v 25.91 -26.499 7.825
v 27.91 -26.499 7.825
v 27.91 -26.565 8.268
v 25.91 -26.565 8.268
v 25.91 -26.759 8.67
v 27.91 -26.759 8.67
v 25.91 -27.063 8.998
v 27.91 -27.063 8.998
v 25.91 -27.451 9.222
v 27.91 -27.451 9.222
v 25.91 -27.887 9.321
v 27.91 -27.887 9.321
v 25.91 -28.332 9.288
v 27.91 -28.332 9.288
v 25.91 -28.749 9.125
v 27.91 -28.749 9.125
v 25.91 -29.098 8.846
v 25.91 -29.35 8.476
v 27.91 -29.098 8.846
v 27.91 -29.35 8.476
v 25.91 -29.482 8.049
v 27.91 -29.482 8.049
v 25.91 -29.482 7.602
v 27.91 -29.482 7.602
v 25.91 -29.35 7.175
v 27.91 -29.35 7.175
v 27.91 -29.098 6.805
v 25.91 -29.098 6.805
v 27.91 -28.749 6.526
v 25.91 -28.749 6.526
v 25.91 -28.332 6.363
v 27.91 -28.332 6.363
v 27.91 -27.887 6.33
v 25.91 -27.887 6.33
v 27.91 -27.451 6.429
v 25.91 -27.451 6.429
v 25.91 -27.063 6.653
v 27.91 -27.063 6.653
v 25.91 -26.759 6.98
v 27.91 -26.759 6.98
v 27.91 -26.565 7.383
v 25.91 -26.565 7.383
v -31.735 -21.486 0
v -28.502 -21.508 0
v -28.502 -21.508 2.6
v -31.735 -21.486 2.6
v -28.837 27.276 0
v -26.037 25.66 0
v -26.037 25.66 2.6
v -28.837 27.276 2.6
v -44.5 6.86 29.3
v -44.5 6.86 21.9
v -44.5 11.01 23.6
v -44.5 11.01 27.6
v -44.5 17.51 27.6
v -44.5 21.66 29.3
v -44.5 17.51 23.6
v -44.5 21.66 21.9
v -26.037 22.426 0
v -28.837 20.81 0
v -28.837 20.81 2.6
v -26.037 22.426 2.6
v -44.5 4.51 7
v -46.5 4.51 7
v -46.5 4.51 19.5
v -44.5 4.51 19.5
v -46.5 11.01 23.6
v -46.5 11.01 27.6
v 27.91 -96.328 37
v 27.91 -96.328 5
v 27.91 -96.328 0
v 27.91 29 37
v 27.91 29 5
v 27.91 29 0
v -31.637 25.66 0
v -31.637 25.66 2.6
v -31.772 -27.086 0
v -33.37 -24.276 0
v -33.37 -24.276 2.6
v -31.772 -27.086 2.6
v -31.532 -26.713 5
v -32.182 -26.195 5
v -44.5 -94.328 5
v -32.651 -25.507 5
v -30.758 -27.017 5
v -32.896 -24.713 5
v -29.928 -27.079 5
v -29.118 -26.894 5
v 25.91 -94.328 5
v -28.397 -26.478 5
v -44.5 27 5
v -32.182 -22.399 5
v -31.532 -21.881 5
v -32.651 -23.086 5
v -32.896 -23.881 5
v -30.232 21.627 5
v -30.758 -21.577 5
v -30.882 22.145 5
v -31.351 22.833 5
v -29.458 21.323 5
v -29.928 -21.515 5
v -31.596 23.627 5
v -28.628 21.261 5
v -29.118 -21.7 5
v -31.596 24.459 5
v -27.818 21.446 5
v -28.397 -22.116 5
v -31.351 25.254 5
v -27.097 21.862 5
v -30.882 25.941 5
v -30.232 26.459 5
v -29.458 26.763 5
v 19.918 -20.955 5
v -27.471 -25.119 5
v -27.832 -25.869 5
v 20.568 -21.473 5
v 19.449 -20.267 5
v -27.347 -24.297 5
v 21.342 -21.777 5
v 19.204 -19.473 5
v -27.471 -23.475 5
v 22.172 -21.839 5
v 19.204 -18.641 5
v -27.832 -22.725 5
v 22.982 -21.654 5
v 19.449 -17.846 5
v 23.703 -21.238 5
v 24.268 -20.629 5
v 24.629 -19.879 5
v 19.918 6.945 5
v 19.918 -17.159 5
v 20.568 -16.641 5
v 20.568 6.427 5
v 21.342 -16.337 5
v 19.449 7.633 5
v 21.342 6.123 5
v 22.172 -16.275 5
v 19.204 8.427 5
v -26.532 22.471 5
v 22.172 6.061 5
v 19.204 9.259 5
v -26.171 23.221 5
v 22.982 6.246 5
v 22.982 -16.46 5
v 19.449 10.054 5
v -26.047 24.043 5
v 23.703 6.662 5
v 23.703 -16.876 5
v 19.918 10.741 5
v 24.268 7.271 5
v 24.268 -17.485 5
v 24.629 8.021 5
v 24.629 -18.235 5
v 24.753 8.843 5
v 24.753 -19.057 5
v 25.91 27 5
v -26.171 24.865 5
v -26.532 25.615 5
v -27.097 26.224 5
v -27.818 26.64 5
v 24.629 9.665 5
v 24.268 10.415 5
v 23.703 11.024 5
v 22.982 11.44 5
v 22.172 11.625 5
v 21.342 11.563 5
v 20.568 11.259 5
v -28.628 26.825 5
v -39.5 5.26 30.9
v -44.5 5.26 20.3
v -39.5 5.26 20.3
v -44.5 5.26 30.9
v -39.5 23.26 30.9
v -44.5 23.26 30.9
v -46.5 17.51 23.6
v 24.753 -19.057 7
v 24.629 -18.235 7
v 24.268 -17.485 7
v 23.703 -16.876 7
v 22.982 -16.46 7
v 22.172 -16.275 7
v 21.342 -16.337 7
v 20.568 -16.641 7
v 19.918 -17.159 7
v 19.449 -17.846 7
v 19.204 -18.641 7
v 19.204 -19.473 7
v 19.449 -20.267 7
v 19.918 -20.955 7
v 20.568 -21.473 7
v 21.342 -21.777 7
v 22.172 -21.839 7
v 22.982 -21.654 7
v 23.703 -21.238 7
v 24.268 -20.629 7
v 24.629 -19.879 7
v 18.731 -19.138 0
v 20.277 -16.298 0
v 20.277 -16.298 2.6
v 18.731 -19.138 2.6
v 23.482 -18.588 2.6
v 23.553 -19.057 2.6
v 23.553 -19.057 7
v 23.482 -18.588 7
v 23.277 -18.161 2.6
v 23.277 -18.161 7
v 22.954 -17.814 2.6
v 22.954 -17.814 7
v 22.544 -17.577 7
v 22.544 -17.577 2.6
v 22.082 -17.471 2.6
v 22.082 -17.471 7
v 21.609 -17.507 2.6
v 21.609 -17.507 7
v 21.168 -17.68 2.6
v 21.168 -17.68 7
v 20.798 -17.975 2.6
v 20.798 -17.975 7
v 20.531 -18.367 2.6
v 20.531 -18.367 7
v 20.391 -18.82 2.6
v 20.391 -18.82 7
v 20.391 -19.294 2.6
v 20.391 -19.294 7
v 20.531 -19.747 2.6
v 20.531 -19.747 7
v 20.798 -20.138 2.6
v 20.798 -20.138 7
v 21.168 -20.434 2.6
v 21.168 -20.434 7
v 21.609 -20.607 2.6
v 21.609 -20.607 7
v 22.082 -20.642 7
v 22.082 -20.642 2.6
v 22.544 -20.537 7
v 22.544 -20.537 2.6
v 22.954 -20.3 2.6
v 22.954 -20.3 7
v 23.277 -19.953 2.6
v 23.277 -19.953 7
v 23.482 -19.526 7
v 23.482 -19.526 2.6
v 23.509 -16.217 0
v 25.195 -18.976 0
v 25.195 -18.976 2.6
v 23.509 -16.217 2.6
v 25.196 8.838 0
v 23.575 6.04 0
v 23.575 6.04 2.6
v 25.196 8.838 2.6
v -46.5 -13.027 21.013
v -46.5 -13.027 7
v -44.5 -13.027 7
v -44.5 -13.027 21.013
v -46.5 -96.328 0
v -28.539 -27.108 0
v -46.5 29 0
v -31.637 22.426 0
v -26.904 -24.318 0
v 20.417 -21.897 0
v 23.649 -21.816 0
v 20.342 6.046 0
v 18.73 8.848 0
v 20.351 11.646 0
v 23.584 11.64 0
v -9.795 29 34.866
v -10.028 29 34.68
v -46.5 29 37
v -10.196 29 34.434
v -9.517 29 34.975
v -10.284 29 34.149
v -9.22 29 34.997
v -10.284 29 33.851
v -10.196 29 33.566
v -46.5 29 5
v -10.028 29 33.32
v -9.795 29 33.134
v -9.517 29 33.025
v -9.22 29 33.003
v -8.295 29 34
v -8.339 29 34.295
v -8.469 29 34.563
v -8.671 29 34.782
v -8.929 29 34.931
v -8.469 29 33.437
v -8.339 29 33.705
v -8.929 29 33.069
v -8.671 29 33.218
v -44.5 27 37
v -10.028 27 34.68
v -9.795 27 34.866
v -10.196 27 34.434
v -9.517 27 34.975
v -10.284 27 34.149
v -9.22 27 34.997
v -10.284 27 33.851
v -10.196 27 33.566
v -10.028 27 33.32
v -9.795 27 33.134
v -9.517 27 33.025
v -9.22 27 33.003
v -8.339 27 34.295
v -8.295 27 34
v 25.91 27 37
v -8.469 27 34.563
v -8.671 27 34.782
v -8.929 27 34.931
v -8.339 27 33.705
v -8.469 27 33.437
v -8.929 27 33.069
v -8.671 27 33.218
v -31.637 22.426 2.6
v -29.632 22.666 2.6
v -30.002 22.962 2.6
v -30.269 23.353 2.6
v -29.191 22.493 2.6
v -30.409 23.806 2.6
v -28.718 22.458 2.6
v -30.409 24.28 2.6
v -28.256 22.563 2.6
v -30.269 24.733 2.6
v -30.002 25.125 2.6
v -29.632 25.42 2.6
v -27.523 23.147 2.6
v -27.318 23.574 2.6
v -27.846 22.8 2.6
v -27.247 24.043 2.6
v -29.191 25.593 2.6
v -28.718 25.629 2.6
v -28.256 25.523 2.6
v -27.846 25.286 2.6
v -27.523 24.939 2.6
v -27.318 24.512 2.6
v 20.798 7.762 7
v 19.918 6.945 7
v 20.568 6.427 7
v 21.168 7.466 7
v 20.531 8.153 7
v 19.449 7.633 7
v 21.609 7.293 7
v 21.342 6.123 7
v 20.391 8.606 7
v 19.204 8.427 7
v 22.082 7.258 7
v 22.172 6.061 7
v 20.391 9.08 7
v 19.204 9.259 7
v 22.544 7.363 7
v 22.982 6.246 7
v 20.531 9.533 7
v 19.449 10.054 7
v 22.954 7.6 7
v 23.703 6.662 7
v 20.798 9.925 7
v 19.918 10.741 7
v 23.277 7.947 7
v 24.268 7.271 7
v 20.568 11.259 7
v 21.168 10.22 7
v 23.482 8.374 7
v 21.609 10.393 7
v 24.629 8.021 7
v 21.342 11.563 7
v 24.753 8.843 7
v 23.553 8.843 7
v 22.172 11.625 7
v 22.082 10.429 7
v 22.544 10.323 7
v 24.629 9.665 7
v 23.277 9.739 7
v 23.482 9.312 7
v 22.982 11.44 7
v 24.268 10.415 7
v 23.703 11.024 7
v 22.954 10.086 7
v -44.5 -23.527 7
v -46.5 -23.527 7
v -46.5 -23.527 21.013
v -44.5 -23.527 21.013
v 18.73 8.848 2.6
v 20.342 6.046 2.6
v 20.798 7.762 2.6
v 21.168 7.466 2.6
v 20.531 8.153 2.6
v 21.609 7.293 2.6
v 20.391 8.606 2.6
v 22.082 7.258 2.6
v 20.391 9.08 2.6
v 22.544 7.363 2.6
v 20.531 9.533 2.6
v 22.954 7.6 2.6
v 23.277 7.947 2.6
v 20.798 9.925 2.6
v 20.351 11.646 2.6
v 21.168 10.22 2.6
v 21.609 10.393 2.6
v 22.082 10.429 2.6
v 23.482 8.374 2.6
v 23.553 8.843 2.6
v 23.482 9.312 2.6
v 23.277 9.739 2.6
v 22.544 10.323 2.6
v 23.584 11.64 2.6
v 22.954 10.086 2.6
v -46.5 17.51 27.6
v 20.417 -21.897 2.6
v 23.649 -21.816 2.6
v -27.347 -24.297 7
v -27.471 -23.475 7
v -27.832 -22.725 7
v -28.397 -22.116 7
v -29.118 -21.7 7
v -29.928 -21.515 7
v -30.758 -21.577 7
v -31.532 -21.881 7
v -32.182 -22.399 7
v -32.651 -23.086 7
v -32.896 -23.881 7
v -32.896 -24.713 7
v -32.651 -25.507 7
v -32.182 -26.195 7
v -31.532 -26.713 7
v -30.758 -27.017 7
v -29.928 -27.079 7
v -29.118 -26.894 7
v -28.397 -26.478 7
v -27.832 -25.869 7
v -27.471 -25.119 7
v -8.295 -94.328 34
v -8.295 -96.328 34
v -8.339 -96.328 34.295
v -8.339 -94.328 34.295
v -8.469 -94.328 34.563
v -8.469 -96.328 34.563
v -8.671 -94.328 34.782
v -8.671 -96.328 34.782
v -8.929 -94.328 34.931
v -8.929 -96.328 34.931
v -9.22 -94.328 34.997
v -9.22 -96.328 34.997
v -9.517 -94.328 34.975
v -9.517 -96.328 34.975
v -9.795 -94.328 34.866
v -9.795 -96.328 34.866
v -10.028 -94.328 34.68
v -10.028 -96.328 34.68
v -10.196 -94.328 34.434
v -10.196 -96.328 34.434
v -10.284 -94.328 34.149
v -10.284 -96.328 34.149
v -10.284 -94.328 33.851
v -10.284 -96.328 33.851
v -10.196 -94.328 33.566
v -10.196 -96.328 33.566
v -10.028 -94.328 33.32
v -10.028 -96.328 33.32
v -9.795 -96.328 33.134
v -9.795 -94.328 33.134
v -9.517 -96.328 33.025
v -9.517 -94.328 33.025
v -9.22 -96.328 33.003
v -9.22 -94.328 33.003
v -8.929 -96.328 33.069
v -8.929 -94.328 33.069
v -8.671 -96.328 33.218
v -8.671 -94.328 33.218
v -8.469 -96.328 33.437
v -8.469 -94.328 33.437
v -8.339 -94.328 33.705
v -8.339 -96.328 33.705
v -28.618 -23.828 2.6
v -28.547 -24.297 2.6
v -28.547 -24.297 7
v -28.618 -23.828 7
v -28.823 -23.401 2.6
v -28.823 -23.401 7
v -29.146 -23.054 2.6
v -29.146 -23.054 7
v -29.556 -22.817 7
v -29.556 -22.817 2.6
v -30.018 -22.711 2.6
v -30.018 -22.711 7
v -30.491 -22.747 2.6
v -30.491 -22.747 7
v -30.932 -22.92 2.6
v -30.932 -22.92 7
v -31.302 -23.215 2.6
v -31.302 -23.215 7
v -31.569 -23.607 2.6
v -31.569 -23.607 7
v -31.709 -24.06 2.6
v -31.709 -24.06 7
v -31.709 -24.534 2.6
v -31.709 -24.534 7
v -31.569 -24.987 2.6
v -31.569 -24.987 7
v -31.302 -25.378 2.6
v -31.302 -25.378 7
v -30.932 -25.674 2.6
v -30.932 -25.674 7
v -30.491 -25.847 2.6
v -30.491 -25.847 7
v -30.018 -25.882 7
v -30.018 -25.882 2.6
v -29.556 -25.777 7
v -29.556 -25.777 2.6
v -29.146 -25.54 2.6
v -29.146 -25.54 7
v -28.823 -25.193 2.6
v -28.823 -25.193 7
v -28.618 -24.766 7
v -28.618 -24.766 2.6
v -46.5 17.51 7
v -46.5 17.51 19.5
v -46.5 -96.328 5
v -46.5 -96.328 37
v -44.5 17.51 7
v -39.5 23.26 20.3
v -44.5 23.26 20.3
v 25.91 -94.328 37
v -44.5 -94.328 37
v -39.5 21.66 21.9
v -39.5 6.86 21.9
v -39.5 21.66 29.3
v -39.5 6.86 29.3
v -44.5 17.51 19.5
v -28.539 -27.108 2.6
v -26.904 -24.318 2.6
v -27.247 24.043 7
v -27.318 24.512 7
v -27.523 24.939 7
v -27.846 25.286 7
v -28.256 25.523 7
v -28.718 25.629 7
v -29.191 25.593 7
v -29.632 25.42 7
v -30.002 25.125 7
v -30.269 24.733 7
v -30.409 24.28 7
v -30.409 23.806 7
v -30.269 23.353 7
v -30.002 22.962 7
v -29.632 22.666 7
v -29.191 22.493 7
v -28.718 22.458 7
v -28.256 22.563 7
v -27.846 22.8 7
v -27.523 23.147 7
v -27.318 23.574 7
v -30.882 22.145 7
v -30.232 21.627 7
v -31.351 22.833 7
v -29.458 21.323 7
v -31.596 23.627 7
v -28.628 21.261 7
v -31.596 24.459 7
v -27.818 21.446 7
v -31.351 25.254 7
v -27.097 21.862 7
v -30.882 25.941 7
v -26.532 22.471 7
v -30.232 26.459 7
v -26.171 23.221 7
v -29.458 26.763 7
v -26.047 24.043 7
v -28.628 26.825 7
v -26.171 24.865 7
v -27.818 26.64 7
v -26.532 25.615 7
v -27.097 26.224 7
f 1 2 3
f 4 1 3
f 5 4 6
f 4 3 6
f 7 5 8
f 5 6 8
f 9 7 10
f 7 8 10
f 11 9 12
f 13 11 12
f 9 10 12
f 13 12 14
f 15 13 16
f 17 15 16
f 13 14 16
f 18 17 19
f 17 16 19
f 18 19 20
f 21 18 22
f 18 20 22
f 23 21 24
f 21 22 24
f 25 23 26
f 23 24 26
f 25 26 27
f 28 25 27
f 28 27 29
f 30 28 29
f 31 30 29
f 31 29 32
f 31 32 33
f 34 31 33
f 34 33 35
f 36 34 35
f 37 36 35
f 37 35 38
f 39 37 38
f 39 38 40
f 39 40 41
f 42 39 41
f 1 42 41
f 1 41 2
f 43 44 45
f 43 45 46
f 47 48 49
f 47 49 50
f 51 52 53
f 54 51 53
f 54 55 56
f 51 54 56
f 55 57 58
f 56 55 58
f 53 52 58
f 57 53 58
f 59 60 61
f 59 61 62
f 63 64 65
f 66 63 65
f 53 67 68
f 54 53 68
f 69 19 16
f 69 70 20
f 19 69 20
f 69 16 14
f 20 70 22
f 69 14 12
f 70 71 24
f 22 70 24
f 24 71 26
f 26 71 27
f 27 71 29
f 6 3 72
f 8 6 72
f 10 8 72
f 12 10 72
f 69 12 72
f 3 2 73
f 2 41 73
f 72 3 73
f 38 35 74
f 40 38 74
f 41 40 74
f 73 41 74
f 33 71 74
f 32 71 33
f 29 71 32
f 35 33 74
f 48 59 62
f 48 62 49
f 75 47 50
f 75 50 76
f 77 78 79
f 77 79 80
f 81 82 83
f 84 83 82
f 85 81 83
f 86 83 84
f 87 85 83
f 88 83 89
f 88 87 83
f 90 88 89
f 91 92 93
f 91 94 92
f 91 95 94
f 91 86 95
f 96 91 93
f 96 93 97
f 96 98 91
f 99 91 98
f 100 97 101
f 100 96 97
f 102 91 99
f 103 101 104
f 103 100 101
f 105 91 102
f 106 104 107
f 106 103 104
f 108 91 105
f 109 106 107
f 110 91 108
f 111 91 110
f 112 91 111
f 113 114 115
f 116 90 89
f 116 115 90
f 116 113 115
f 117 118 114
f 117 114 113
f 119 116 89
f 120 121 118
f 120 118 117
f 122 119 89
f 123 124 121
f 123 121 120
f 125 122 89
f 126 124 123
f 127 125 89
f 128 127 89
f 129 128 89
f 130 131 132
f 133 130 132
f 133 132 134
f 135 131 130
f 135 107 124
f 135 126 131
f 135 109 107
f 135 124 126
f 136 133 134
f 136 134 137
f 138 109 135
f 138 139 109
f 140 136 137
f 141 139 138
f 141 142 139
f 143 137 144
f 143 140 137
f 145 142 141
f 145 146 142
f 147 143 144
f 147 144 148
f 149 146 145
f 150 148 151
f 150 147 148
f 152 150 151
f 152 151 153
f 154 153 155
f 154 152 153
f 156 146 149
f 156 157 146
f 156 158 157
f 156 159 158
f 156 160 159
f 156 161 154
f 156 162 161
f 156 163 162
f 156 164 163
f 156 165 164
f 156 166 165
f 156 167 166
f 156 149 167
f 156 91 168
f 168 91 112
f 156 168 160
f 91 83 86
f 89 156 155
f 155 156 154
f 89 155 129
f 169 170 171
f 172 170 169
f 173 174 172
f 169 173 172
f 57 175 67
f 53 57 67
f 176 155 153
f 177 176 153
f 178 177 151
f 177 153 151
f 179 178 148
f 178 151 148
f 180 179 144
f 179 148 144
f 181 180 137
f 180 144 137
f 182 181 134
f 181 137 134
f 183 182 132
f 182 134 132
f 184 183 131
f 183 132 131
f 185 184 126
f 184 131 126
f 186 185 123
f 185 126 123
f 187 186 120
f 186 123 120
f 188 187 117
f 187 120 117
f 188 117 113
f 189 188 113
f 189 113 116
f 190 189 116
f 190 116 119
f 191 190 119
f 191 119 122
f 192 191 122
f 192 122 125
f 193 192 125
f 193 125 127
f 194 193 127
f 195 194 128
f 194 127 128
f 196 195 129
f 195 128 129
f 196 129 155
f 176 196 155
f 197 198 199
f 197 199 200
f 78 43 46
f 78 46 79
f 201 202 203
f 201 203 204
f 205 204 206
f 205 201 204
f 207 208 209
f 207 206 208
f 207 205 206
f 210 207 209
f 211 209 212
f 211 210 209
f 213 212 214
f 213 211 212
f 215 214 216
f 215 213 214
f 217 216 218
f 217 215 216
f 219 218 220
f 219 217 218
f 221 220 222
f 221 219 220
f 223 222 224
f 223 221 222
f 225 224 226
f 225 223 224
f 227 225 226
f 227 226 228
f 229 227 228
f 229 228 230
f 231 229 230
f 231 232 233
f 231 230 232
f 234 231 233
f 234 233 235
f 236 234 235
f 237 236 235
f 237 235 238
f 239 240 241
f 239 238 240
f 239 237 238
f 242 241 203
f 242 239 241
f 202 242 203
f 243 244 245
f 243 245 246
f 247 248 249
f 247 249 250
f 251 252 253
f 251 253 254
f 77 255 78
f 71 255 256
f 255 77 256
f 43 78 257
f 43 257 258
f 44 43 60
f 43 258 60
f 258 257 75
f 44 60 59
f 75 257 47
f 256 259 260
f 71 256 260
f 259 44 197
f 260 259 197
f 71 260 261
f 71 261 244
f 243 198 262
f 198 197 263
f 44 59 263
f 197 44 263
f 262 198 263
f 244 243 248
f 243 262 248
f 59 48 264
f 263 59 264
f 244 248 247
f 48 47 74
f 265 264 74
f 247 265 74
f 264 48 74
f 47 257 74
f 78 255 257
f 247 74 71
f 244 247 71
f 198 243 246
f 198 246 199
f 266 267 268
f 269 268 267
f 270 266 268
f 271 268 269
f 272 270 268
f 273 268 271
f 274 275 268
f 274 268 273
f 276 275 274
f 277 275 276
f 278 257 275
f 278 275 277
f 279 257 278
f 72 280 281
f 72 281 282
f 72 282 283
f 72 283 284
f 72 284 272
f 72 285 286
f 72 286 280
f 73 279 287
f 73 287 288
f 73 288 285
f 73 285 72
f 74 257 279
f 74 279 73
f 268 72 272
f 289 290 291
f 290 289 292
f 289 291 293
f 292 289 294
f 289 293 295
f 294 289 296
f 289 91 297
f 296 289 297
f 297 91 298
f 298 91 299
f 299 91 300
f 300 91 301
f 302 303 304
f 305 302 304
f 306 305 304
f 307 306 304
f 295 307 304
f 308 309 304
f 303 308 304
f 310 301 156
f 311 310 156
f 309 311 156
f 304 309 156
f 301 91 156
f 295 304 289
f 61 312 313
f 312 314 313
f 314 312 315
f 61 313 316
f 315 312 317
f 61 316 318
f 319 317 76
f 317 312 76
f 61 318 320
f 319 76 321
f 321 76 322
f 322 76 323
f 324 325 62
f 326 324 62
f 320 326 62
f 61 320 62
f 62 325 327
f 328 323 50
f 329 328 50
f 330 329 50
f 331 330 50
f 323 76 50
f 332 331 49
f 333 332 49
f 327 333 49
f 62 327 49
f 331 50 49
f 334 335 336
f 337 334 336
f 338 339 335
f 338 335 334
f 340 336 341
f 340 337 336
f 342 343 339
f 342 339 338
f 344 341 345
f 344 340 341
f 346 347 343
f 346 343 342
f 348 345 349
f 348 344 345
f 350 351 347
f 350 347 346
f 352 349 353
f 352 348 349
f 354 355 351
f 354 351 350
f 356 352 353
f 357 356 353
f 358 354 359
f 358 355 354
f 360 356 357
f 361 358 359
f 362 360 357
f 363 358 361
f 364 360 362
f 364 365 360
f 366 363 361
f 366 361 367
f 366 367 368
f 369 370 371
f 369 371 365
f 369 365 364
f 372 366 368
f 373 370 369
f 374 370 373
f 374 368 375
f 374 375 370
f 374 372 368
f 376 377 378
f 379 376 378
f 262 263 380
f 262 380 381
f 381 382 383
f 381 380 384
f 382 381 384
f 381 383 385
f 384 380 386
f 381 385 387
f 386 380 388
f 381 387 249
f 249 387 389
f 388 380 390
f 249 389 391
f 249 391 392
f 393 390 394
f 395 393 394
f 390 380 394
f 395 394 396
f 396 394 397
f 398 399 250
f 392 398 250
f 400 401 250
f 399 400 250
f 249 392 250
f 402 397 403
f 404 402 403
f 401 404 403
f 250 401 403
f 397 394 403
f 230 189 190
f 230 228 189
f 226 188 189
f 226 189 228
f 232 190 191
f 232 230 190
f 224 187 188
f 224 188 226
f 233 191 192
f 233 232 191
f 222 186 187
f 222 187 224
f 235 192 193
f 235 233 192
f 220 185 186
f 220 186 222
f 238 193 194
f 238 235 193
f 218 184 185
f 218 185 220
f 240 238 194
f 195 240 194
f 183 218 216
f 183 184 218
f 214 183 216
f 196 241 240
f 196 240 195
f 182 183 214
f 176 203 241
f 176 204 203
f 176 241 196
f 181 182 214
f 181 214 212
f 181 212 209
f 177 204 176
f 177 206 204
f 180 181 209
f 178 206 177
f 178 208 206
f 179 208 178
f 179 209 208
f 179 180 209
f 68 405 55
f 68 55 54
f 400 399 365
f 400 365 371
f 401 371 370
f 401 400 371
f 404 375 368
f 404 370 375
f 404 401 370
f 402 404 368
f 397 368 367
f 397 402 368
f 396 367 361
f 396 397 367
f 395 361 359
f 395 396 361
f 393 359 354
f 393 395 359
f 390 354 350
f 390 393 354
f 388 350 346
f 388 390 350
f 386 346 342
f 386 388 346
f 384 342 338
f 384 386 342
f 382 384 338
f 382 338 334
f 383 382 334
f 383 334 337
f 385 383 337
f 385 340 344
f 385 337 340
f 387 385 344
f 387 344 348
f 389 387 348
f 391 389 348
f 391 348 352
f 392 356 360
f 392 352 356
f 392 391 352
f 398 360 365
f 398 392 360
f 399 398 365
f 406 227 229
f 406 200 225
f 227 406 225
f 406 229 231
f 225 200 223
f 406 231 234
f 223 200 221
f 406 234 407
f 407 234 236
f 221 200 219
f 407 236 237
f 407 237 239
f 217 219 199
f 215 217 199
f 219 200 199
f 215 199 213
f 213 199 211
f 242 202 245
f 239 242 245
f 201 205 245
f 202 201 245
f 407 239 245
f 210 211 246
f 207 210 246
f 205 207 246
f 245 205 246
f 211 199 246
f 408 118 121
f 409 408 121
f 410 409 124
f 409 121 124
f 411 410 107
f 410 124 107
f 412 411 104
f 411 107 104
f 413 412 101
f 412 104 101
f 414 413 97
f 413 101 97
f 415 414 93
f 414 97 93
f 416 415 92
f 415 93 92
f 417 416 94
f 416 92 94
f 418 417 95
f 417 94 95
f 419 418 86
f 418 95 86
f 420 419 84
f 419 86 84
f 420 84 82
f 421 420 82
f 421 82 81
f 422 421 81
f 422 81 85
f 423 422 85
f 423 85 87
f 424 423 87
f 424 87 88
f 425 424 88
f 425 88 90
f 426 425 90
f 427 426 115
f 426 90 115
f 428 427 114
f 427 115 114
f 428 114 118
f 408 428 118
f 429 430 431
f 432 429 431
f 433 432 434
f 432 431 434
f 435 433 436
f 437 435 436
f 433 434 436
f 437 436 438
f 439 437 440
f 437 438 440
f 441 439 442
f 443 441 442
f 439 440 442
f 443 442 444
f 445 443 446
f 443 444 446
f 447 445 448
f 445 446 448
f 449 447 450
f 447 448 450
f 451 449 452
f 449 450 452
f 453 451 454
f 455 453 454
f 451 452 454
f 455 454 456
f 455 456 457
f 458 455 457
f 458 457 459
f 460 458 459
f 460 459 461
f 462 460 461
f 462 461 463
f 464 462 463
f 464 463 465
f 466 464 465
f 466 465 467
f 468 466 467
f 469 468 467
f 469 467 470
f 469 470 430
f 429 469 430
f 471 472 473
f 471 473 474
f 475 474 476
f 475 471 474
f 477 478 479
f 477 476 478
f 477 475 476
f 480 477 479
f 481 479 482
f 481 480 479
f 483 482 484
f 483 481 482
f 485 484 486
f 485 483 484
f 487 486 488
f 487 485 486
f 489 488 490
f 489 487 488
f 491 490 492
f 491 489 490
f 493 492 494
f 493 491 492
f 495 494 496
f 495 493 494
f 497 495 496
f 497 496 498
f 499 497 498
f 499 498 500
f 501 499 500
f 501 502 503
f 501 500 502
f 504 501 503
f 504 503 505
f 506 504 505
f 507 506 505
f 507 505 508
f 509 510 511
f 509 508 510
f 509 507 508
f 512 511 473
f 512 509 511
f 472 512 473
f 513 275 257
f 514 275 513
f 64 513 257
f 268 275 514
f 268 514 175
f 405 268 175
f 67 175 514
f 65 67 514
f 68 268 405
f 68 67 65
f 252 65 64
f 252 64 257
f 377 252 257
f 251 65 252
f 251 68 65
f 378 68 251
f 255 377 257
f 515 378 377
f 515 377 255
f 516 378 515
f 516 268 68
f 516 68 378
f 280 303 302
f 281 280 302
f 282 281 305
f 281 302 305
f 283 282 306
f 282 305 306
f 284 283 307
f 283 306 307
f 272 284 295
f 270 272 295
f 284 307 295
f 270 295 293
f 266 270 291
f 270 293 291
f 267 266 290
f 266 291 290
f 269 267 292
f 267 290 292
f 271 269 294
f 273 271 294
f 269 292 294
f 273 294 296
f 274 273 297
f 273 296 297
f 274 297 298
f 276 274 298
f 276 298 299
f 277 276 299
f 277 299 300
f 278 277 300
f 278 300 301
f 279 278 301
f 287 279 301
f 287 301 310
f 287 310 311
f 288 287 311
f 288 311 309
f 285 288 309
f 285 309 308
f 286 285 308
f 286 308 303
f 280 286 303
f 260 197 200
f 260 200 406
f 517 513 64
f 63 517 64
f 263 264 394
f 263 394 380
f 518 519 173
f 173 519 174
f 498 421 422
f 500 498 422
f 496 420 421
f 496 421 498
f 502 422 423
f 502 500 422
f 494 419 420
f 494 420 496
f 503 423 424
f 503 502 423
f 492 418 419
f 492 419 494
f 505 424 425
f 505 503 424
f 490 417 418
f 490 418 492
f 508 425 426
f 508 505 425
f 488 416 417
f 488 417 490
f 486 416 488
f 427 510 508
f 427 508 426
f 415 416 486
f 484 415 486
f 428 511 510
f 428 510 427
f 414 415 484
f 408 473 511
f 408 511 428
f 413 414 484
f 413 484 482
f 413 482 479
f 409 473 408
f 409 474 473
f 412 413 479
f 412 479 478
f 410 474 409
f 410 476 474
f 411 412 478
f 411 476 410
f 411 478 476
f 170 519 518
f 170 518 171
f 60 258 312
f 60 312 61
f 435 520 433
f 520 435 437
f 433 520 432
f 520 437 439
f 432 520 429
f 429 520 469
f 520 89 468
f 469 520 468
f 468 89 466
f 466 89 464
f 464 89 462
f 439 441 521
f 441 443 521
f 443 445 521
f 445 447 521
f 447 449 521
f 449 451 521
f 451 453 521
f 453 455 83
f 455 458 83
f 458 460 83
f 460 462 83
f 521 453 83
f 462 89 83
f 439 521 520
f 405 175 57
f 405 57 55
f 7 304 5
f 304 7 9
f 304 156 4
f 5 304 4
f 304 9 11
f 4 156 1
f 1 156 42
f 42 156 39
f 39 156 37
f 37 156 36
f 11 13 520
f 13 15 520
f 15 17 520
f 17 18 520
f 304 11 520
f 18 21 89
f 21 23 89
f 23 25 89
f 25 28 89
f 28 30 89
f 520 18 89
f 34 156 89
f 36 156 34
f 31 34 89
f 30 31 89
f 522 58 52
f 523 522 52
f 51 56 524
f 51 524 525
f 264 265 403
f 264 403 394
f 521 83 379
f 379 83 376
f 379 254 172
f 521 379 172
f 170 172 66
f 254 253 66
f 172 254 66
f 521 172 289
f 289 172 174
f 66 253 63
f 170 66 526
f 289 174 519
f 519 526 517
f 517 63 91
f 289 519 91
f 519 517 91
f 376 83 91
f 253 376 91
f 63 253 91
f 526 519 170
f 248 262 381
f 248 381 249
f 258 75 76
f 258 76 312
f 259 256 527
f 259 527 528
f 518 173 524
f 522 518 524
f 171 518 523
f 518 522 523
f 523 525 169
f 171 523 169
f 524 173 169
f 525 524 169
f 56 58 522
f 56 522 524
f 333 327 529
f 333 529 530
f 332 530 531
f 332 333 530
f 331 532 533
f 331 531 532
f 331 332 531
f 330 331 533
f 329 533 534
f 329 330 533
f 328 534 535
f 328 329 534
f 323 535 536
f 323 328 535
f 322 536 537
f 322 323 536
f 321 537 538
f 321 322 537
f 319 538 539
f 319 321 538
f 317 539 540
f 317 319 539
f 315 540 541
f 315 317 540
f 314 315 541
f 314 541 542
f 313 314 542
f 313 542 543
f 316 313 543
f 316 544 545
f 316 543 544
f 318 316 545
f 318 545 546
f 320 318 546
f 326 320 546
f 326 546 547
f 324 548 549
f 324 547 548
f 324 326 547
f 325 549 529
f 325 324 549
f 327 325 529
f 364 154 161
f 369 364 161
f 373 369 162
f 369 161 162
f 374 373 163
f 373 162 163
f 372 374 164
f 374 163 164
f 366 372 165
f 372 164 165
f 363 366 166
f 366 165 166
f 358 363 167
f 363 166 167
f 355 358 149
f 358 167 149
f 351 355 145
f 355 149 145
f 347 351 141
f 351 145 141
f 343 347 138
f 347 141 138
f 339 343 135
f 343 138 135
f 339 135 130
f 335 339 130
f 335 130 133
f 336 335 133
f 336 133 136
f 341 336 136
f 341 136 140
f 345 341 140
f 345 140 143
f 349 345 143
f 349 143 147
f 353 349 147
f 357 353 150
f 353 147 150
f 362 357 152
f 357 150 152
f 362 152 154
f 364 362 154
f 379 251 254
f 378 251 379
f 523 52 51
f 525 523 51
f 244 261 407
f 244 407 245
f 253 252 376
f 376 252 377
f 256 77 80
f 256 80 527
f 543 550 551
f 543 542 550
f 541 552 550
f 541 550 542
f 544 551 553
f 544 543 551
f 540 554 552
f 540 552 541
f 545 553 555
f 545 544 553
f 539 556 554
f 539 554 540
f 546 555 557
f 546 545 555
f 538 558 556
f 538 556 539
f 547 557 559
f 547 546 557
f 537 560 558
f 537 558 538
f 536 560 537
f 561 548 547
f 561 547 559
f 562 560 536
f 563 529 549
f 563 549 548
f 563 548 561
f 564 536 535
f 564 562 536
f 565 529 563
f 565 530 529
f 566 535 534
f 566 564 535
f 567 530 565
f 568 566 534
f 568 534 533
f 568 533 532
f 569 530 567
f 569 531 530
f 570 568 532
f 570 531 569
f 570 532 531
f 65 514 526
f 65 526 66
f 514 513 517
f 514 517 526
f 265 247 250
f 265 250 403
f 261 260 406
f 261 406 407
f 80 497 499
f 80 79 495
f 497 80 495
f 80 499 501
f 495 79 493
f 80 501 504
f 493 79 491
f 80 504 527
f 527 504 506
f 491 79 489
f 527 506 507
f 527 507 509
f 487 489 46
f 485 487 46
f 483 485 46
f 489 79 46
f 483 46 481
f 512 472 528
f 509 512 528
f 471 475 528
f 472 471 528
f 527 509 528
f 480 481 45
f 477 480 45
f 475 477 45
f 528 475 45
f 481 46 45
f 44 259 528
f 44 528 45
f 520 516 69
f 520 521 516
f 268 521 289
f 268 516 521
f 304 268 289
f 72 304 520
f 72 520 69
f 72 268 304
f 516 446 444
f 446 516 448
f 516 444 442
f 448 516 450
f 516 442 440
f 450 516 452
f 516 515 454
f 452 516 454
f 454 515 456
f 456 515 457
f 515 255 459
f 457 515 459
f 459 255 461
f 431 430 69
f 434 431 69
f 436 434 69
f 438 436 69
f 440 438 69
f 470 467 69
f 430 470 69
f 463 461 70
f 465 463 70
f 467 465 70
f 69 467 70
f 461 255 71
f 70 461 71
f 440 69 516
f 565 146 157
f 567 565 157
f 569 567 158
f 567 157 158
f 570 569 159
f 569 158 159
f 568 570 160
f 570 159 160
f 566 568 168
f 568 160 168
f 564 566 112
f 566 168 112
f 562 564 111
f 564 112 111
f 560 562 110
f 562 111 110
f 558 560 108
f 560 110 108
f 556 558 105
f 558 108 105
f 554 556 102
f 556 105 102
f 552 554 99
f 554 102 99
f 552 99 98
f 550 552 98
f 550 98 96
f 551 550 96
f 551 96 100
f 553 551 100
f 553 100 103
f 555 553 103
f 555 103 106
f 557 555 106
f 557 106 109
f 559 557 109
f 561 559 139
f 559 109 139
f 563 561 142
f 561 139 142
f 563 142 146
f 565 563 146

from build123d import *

# Parameters (mm, degrees)
F0_R      = 1.59
F1_DEPTH  = 5
F2_W      = 74.4103554785
F2_H      = 125.3275879622
F3_DEPTH  = 32
F4_R      = 2.7900010005
F4_R_2    = 2.7899997517
F4_R_3    = 2.79
F5_DEPTH  = 2
F6_DEPTH  = 37.001
F8_DEPTH  = 2.6
F9_W      = 13
F9_H      = 12.5
F9_W_2    = 10.5
F9_H_2    = 14.01349
F9_W_3    = 6.5
F9_H_3    = 4
F10_DEPTH = 3
F9_W_4    = 17.9999999672
F9_H_4    = 10.5999999672
F9_W_5    = 14.8
F9_H_5    = 7.4
F11_DEPTH = 7
F13_DEPTH = 6
F14_R     = 1
F15_DEPTH = 125.3285879622
F16_R     = 1.5
F17_DEPTH = 3


# Not quite as in the source:
# - a feature names something its author has since deleted; it is built from what else it names


with BuildPart() as f1:
    # F0 (on Top) → F1 (new body)
    with BuildSketch(Plane.XY):
        Polygon((27.9103554785, 29), (-46.5, 29), (-46.5, -29), (-46.5, -96.3275879622), (27.9103554785, -96.3275879622), align=None)
        with Locations((-30.1368717179, -24.2969288903)):
            Circle(F0_R, mode=Mode.SUBTRACT)
        with Locations((-28.8368717179, 24.0430711097)):
            Circle(F0_R, mode=Mode.SUBTRACT)
        with Locations((21.9631282821, -19.0569288903)):
            Circle(F0_R, mode=Mode.SUBTRACT)
        with Locations((21.9631282821, 8.8430711097)):
            Circle(F0_R, mode=Mode.SUBTRACT)
        with Locations((21.9631282821, -19.0569288903)):
            Circle(F0_R)
        with Locations((-28.8368717179, 24.0430711097)):
            Circle(F0_R)
        with Locations((-30.1368717179, -24.2969288903)):
            Circle(F0_R)
        with Locations((21.9631282821, 8.8430711097)):
            Circle(F0_R)
    extrude(amount=F1_DEPTH)

    # F2 (on face) → F3 (join)
    with BuildSketch(Plane.XY.offset(5)):
        with Locations((-9.2948222607, -33.6637939811)):
            Rectangle(F2_W, F2_H)
        Polygon((25.9103551507, 26.9999996722), (25.9103551507, -94.3275876343), (-44.4999996722, -94.3275876343), (-44.4999996722, -29), (-44.4999996722, 26.9999996722), align=None, mode=Mode.SUBTRACT)
    extrude(amount=F3_DEPTH)

    # F4 (on face) → F5 (join)
    with BuildSketch(Plane.XY.offset(5)):
        with Locations((-28.8368717179, 24.0430711097)):
            Circle(F4_R)
        with Locations((21.9631282821, 8.8430711097)):
            Circle(F4_R_2)
        with Locations((21.9631282821, -19.0569288903)):
            Circle(F4_R_3)
        with Locations((-30.1368717179, -24.2969288903)):
            Circle(F4_R_3)
    extrude(amount=F5_DEPTH)

    # F0 (on Top) → F6 (cut, through all)
    with BuildSketch(Plane.XY):
        with Locations((-30.1368717179, -24.2969288903)):
            Circle(F0_R)
        with Locations((21.9631282821, -19.0569288903)):
            Circle(F0_R)
        with Locations((21.9631282821, 8.8430711097)):
            Circle(F0_R)
        with Locations((-28.8368717179, 24.0430711097)):
            Circle(F0_R)
    extrude(amount=F6_DEPTH, mode=Mode.SUBTRACT)

    # F7 (on Top) → F8 (cut)
    with BuildSketch(Plane.XY):
        Polygon((-28.5388533662, -27.1075641711), (-26.9037809882, -24.3183220425), (-28.5017993398, -21.5076867618), (-31.7348900695, -21.4862936096), (-33.3699624476, -24.2755357382), (-31.7719440959, -27.0861710189), align=None)
        Polygon((23.649281557, -21.8155916945), (25.1952769884, -18.9760087217), (23.5091237135, -16.2173459175), (20.2769750072, -16.2982660862), (18.7309795758, -19.137849059), (20.4171328507, -21.8965118631), align=None)
        Polygon((23.5751015985, 6.040416054), (25.1962854165, 8.837753424), (23.5843121002, 11.6404084796), (20.3511549658, 11.6457261653), (18.7299711478, 8.8483887953), (20.3419444641, 6.0457337397), align=None)
        Polygon((-28.8368717179, 20.8099096022), (-26.0368717179, 22.4264903559), (-26.0368717179, 25.6596518634), (-28.8368717179, 27.2762326171), (-31.6368717179, 25.6596518634), (-31.6368717179, 22.4264903559), align=None)
    extrude(amount=F8_DEPTH, mode=Mode.SUBTRACT)

    # F9 (on face) → F10 (cut)
    with BuildSketch(Plane(origin=(-46.5, 0, 0), x_dir=(0, -1, 0), z_dir=(-1, 0, 0))):
        with Locations((-11.010112679, 13.25)):
            Rectangle(F9_W, F9_H)
        with Locations((18.2770747468, 14.006745)):
            Rectangle(F9_W_2, F9_H_2)
        with Locations((-14.260112679, 25.6000000164)):
            Rectangle(F9_W_3, F9_H_3)
    extrude(amount=-F10_DEPTH, mode=Mode.SUBTRACT)

    # F9 (on face) → F11 (join)
    with BuildSketch(Plane(origin=(-46.5, 0, 0), x_dir=(0, -1, 0), z_dir=(-1, 0, 0))):
        with Locations((-14.260112679, 25.6000000164)):
            Rectangle(F9_W_4, F9_H_4)
        with Locations((-14.260112679, 25.6000000164)):
            Rectangle(F9_W_5, F9_H_5, mode=Mode.SUBTRACT)
    extrude(amount=-F11_DEPTH)

    # F12 (on face) → F13 (cut)
    with BuildSketch(Plane.XY.offset(5)):
        with BuildLine():
            ThreePointArc((-40.7473873347, 2.5), (-41.9973873347, 1.25), (-40.7473873347, 0))
            Line((-40.7473873347, 0), (-10.7473873347, 0))
            ThreePointArc((-10.7473873347, 0), (-9.4973873347, 1.25), (-10.7473873347, 2.5))
            Line((-10.7473873347, 2.5), (-40.7473873347, 2.5))
        make_face()
        with BuildLine():
            ThreePointArc((-40.7473873347, -2.0948293991), (-41.9973873347, -3.3448293991), (-40.7473873347, -4.5948293991))
            Line((-40.7473873347, -4.5948293991), (-10.7473873347, -4.5948293991))
            ThreePointArc((-10.7473873347, -4.5948293991), (-9.4973873347, -3.3448293991), (-10.7473873347, -2.0948293991))
            Line((-10.7473873347, -2.0948293991), (-40.7473873347, -2.0948293991))
        make_face()
        with BuildLine():
            ThreePointArc((-40.7473873347, -6.6774361208), (-41.9973873347, -7.9274361208), (-40.7473873347, -9.1774361208))
            Line((-40.7473873347, -9.1774361208), (-10.7473873347, -9.1774361208))
            ThreePointArc((-10.7473873347, -9.1774361208), (-9.4973873347, -7.9274361208), (-10.7473873347, -6.6774361208))
            Line((-10.7473873347, -6.6774361208), (-40.7473873347, -6.6774361208))
        make_face()
        with BuildLine():
            ThreePointArc((-40.7473873347, -11.2855438516), (-41.9973873347, -12.5355438516), (-40.7473873347, -13.7855438516))
            Line((-40.7473873347, -13.7855438516), (-10.7473873347, -13.7855438516))
            ThreePointArc((-10.7473873347, -13.7855438516), (-9.4973873347, -12.5355438516), (-10.7473873347, -11.2855438516))
            Line((-10.7473873347, -11.2855438516), (-40.7473873347, -11.2855438516))
        make_face()
        with BuildLine():
            ThreePointArc((-40.7473873347, -15.9455886483), (-41.9973873347, -17.1955886483), (-40.7473873347, -18.4455886483))
            Line((-40.7473873347, -18.4455886483), (-10.7473873347, -18.4455886483))
            ThreePointArc((-10.7473873347, -18.4455886483), (-9.4973873347, -17.1955886483), (-10.7473873347, -15.9455886483))
            Line((-10.7473873347, -15.9455886483), (-40.7473873347, -15.9455886483))
        make_face()
        with BuildLine():
            ThreePointArc((-40.7473873347, 6.6440958157), (-41.9973873347, 5.3940958157), (-40.7473873347, 4.1440958157))
            Line((-40.7473873347, 4.1440958157), (-10.7473873347, 4.1440958157))
            ThreePointArc((-10.7473873347, 4.1440958157), (-9.4973873347, 5.3940958157), (-10.7473873347, 6.6440958157))
            Line((-10.7473873347, 6.6440958157), (-40.7473873347, 6.6440958157))
        make_face()
        with BuildLine():
            ThreePointArc((-40.7473873347, 11.013558656), (-41.9973873347, 9.763558656), (-40.7473873347, 8.513558656))
            Line((-40.7473873347, 8.513558656), (-10.7473873347, 8.513558656))
            ThreePointArc((-10.7473873347, 8.513558656), (-9.4973873347, 9.763558656), (-10.7473873347, 11.013558656))
            Line((-10.7473873347, 11.013558656), (-40.7473873347, 11.013558656))
        make_face()
        with BuildLine():
            ThreePointArc((-40.7473873347, 15.4895936698), (-41.9973873347, 14.2395936698), (-40.7473873347, 12.9895936698))
            Line((-40.7473873347, 12.9895936698), (-10.7473873347, 12.9895936698))
            ThreePointArc((-10.7473873347, 12.9895936698), (-9.4973873347, 14.2395936698), (-10.7473873347, 15.4895936698))
            Line((-10.7473873347, 15.4895936698), (-40.7473873347, 15.4895936698))
        make_face()
        with BuildLine():
            ThreePointArc((-40.7473873347, 19.7524824739), (-41.9973873347, 18.5024824739), (-40.7473873347, 17.2524824739))
            Line((-40.7473873347, 17.2524824739), (-10.7473873347, 17.2524824739))
            ThreePointArc((-10.7473873347, 17.2524824739), (-9.4973873347, 18.5024824739), (-10.7473873347, 19.7524824739))
            Line((-10.7473873347, 19.7524824739), (-40.7473873347, 19.7524824739))
        make_face()
    extrude(amount=F13_DEPTH, mode=Mode.SUBTRACT)

    # F14 (on face) → F15 (cut, through all)
    with BuildSketch(Plane.XZ.offset(96.3275879622)):
        with Locations((-9.2948222607, 34)):
            Circle(F14_R)
    extrude(amount=-F15_DEPTH, mode=Mode.SUBTRACT)

    # F16 (on face) → F17 (cut)
    with BuildSketch(Plane.YZ.offset(27.9103554785)):
        with Locations((-27.9986988753, 7.8254723921)):
            Circle(F16_R)
    extrude(amount=-F17_DEPTH, mode=Mode.SUBTRACT)


solid = f1.part
